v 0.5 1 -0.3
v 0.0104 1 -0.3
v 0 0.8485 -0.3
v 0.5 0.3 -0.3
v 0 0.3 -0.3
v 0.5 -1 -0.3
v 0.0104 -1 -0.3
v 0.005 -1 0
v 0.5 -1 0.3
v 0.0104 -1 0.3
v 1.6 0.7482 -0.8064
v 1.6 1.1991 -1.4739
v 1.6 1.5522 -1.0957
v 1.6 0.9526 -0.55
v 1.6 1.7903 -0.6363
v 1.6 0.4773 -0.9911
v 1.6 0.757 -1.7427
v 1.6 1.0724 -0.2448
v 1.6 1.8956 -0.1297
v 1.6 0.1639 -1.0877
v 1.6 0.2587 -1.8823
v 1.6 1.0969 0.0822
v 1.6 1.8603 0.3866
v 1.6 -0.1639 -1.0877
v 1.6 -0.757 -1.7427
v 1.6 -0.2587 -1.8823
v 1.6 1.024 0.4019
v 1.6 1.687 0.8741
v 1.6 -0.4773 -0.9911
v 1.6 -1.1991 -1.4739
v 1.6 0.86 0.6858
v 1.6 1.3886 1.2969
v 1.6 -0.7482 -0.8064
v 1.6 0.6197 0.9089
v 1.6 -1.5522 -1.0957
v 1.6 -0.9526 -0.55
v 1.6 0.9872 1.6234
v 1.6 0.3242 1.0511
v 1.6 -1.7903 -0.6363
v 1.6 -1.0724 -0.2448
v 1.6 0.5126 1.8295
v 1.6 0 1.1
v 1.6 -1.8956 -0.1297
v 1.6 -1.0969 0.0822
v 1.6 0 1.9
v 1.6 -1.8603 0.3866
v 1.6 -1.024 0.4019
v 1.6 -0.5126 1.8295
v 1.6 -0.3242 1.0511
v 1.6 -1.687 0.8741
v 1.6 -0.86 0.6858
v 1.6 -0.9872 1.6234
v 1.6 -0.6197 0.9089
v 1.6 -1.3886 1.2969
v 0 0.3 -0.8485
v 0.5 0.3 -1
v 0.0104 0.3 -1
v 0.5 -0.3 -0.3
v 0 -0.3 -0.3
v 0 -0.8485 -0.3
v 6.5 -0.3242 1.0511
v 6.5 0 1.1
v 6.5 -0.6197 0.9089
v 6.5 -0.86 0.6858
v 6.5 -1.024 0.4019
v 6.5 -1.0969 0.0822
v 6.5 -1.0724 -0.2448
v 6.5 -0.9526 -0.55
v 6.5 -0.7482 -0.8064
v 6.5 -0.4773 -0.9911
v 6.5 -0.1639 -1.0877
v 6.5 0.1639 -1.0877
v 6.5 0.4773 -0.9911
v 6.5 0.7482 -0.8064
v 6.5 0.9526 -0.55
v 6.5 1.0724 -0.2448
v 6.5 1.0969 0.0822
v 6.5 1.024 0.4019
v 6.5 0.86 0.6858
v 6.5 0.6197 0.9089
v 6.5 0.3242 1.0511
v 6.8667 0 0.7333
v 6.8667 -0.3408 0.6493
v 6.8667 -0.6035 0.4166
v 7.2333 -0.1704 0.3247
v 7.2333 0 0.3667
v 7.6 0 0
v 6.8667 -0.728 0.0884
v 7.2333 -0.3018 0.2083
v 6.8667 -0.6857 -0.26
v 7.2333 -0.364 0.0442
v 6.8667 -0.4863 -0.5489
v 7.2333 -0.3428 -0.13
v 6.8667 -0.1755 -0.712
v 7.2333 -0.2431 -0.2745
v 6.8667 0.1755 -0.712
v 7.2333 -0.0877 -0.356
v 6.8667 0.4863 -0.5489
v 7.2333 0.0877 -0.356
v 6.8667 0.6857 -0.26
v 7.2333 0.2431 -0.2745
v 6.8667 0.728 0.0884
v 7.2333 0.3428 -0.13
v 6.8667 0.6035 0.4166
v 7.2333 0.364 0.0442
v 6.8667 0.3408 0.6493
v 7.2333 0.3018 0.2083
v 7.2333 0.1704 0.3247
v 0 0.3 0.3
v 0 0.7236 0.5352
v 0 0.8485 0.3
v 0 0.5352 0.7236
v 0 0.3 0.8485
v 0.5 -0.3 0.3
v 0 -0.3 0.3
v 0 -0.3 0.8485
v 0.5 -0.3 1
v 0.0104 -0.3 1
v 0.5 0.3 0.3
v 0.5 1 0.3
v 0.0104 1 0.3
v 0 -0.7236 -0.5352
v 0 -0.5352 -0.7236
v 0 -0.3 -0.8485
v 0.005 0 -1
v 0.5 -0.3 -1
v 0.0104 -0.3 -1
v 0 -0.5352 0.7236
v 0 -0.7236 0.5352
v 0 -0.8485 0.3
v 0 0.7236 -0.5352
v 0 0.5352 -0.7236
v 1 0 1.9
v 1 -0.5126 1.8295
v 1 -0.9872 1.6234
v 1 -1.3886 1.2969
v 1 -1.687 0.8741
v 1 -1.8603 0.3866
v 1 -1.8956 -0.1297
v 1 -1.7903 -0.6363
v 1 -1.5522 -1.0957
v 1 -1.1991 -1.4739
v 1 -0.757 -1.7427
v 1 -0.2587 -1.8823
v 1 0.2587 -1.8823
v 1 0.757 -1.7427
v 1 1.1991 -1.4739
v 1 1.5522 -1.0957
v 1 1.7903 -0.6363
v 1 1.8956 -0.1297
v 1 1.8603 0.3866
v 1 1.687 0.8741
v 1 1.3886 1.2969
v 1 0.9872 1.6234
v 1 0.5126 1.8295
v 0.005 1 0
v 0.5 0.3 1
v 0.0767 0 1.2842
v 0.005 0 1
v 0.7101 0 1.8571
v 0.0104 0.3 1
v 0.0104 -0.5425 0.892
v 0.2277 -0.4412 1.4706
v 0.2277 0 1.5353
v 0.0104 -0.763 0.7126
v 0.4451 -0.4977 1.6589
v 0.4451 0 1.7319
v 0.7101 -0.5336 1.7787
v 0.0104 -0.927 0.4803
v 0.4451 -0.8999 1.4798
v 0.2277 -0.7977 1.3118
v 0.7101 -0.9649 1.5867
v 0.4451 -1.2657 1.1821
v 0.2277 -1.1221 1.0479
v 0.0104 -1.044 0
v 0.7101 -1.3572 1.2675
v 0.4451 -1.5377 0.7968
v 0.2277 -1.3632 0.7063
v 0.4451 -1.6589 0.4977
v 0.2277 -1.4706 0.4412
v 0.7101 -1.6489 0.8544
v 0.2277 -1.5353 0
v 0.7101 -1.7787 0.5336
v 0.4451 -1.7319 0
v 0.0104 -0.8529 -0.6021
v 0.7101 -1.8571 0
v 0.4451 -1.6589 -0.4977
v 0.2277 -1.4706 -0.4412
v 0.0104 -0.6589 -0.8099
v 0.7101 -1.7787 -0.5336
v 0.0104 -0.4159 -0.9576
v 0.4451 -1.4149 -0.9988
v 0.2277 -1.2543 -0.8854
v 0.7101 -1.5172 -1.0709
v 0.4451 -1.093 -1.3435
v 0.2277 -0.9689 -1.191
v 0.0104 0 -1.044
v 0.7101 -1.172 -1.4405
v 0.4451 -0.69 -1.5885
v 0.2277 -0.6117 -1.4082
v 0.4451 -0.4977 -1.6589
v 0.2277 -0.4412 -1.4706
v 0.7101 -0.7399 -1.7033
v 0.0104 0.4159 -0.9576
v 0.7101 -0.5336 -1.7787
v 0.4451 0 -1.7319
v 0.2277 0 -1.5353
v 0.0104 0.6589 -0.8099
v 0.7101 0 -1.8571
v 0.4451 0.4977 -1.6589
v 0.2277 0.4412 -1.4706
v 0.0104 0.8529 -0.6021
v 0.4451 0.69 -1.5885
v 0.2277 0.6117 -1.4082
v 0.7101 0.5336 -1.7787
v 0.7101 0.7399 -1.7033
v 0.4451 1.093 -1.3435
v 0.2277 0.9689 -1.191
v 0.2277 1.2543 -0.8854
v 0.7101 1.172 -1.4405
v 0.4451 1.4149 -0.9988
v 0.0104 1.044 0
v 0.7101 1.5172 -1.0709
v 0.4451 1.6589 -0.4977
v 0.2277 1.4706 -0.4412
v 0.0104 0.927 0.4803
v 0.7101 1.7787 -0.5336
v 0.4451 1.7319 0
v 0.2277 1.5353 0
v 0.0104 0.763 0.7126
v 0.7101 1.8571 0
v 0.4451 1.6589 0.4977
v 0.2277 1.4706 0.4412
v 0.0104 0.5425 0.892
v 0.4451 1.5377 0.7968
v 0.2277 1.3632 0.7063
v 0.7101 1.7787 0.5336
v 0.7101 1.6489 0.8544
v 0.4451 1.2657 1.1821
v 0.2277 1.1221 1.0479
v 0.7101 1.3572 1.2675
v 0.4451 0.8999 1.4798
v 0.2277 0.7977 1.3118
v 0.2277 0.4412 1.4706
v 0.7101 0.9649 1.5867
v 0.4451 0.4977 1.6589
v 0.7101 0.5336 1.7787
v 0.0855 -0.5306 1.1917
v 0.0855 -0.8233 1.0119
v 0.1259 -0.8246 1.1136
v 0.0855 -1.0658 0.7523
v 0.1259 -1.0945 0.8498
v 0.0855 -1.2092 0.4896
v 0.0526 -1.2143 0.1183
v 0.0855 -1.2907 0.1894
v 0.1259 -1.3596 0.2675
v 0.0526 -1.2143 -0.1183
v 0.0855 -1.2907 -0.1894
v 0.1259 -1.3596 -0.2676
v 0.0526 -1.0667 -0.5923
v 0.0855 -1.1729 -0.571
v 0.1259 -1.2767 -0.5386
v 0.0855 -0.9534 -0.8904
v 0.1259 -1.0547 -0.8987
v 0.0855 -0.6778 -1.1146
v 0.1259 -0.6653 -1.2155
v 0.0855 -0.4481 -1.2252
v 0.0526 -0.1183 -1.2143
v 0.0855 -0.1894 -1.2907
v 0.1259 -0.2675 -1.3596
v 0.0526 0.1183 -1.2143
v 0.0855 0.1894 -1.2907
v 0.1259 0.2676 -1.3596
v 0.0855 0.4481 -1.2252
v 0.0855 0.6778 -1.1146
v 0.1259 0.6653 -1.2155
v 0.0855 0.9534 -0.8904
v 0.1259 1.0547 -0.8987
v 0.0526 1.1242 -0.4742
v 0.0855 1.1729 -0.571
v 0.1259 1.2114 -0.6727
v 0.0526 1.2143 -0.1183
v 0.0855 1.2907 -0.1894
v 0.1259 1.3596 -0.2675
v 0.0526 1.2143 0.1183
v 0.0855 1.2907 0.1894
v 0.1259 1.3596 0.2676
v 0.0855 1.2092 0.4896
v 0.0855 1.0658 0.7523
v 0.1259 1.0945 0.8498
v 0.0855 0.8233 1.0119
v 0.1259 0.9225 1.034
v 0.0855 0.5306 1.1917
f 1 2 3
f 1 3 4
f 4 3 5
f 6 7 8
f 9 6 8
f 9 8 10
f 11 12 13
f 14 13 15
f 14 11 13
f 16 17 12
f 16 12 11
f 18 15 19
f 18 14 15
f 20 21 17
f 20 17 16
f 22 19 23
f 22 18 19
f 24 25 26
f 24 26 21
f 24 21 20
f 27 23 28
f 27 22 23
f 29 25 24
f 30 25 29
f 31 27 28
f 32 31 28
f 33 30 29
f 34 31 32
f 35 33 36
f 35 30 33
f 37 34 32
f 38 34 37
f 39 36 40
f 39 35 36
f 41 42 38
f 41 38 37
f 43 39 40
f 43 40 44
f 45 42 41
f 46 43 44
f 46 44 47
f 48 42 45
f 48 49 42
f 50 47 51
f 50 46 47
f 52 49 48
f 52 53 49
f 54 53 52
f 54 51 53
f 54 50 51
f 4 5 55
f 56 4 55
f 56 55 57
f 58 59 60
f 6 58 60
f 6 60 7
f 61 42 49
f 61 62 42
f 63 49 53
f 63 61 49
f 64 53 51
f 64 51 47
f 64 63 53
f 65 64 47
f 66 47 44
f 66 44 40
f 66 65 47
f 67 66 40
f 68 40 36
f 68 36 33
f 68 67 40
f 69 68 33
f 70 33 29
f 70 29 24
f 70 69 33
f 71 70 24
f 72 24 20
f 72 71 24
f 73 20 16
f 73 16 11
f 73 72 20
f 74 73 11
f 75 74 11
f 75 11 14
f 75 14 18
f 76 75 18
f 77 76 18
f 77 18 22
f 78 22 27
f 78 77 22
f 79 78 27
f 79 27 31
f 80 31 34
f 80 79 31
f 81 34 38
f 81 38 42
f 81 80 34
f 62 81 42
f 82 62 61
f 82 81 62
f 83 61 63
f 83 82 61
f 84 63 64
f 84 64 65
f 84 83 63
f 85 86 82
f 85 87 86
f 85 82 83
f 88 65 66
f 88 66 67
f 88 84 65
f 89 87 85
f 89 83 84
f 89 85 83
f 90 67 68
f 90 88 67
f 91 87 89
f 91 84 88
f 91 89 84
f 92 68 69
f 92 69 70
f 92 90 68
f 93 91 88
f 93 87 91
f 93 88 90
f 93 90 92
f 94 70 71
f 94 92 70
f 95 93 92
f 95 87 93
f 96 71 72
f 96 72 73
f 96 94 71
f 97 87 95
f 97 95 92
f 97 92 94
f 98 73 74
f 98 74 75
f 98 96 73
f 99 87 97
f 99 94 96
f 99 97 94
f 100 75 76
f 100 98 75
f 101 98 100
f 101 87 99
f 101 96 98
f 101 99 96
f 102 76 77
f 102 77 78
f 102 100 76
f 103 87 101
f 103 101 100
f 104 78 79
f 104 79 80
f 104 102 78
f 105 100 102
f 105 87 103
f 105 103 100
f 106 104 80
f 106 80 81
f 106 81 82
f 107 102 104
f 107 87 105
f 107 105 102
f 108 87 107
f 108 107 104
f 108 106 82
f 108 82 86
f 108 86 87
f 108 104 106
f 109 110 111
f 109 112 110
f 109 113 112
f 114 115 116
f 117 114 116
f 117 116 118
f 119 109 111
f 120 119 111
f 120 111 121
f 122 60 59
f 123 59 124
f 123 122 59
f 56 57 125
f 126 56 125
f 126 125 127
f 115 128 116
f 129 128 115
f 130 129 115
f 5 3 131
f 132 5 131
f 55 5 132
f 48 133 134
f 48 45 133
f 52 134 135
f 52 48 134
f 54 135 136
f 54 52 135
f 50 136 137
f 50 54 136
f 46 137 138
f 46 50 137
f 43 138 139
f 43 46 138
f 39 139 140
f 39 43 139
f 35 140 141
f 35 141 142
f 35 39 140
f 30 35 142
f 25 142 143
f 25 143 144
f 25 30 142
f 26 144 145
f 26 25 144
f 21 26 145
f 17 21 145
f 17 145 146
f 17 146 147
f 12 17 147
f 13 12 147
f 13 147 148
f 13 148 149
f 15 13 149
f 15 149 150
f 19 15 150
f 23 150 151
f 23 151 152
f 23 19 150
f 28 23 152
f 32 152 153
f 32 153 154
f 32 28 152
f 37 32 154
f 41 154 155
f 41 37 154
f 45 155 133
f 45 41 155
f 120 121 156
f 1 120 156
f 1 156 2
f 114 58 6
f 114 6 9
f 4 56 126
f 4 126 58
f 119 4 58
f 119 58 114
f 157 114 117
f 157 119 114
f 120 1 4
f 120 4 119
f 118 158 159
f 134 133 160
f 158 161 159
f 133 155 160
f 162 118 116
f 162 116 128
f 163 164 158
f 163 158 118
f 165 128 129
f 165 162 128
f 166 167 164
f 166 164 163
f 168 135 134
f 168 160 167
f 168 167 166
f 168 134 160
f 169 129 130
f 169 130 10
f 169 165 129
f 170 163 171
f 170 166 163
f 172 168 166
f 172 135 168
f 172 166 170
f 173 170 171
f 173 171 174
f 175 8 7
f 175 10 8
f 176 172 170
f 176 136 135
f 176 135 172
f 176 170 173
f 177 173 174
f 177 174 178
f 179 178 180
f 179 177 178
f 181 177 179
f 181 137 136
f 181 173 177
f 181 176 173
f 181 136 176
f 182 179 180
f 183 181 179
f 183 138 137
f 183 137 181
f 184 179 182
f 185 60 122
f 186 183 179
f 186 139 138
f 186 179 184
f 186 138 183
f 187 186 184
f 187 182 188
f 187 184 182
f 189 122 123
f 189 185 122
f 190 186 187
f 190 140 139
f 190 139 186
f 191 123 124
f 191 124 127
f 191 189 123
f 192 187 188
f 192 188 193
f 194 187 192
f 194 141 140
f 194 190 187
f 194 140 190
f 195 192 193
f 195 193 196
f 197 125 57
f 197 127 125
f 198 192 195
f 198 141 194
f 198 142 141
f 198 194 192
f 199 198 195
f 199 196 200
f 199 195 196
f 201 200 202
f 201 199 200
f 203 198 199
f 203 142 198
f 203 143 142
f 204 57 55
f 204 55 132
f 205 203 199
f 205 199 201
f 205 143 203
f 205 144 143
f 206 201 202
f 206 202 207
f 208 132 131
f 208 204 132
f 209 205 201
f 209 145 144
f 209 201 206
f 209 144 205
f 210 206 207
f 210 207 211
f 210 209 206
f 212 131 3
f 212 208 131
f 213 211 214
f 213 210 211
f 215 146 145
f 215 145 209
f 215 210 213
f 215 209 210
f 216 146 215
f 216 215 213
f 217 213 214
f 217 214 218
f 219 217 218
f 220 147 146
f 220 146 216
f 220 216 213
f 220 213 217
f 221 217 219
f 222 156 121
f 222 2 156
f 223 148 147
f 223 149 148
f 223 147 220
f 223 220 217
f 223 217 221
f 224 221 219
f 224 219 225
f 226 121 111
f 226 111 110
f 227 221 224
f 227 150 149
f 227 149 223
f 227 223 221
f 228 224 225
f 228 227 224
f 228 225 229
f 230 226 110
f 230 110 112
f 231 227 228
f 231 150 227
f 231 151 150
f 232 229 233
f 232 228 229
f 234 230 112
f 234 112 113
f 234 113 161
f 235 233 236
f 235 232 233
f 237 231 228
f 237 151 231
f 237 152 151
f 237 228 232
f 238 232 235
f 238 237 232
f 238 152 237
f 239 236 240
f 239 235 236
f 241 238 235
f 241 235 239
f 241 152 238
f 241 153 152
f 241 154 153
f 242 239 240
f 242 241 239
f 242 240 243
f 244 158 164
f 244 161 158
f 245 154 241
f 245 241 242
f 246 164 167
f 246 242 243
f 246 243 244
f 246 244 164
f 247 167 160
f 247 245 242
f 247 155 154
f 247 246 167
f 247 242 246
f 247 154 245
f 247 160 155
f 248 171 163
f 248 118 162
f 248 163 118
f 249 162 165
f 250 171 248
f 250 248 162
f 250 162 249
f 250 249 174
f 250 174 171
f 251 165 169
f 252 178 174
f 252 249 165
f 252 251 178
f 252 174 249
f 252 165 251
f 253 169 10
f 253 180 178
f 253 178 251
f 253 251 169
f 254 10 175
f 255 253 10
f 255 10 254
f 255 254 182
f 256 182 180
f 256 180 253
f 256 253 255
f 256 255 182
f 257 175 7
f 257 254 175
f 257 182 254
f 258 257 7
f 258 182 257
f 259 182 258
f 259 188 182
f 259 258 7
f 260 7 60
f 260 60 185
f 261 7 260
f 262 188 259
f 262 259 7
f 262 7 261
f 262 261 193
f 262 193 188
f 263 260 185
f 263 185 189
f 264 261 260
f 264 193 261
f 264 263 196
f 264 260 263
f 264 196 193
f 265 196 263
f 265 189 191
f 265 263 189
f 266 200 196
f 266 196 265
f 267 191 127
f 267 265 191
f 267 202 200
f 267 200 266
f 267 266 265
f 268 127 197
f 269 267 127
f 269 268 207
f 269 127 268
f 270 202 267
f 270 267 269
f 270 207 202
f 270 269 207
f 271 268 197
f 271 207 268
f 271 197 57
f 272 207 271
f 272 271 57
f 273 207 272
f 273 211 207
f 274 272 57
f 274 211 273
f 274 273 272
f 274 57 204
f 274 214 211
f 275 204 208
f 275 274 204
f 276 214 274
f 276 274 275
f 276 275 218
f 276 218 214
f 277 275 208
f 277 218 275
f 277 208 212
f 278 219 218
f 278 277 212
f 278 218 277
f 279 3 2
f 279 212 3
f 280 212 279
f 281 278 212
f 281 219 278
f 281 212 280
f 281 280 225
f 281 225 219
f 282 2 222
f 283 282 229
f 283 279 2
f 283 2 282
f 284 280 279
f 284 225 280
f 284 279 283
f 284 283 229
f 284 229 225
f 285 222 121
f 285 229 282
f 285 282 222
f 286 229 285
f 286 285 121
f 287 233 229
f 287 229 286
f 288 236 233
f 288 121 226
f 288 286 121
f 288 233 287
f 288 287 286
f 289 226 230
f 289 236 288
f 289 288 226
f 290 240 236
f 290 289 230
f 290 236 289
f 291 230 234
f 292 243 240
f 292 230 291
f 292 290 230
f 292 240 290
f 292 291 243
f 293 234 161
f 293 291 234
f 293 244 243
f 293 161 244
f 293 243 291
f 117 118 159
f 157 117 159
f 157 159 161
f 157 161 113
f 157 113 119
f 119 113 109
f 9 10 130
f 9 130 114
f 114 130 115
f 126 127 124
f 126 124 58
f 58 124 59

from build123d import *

# Parameters (mm, degrees)
CUT_EXTRUDE_1_DEPTH = 0.5
FILLET_1_R          = 1


with BuildPart() as part:
    # 草图1 → 旋转1 (revolve)
    with BuildSketch(Plane.XY, mode=Mode.PRIVATE) as revolve_1_sk:
        Polygon((0, 0), (0, 1.9), (1.6, 1.9), (1.6, 1.1), (6.5, 1.1), (7.6, 0), align=None)
    revolve(revolve_1_sk.sketch.rotate(Axis((-6.976540153, 0, 0), (1, 0, 0)), 90), axis=Axis((-6.976540153, 0, 0), (1, 0, 0)))

    # 草图2 → 切除-拉伸1 (cut)
    with BuildSketch(Plane.ZY):
        Polygon((-0.3, 0.3), (-1, 0.3), (-1, -0.3), (-0.3, -0.3), (-0.3, -1), (0.3, -1), (0.3, -0.3), (1, -0.3), (1, 0.3), (0.3, 0.3), (0.3, 1), (-0.3, 1), align=None)
    extrude(amount=-CUT_EXTRUDE_1_DEPTH, mode=Mode.SUBTRACT)

    # 圆角1
    # the kernel refuses this fillet: 1 mm, written as the material it takes off along each edge
    with BuildSketch(Plane(origin=(0, 0, 0), x_dir=(0, 0, 1), z_dir=(0, 1, 0))) as fillet_1_piece_1:
        with BuildLine():
            CenterArc((1.9 - FILLET_1_R, FILLET_1_R), FILLET_1_R, 270, 90)
            Line((1.9, FILLET_1_R), (1.9, 0))
            Line((1.9, 0), (1.9 - FILLET_1_R, 0))
        make_face()
    revolve(axis=Axis((0, 0, 0), (1, 0, 0)), mode=Mode.SUBTRACT)


solid = part.part
